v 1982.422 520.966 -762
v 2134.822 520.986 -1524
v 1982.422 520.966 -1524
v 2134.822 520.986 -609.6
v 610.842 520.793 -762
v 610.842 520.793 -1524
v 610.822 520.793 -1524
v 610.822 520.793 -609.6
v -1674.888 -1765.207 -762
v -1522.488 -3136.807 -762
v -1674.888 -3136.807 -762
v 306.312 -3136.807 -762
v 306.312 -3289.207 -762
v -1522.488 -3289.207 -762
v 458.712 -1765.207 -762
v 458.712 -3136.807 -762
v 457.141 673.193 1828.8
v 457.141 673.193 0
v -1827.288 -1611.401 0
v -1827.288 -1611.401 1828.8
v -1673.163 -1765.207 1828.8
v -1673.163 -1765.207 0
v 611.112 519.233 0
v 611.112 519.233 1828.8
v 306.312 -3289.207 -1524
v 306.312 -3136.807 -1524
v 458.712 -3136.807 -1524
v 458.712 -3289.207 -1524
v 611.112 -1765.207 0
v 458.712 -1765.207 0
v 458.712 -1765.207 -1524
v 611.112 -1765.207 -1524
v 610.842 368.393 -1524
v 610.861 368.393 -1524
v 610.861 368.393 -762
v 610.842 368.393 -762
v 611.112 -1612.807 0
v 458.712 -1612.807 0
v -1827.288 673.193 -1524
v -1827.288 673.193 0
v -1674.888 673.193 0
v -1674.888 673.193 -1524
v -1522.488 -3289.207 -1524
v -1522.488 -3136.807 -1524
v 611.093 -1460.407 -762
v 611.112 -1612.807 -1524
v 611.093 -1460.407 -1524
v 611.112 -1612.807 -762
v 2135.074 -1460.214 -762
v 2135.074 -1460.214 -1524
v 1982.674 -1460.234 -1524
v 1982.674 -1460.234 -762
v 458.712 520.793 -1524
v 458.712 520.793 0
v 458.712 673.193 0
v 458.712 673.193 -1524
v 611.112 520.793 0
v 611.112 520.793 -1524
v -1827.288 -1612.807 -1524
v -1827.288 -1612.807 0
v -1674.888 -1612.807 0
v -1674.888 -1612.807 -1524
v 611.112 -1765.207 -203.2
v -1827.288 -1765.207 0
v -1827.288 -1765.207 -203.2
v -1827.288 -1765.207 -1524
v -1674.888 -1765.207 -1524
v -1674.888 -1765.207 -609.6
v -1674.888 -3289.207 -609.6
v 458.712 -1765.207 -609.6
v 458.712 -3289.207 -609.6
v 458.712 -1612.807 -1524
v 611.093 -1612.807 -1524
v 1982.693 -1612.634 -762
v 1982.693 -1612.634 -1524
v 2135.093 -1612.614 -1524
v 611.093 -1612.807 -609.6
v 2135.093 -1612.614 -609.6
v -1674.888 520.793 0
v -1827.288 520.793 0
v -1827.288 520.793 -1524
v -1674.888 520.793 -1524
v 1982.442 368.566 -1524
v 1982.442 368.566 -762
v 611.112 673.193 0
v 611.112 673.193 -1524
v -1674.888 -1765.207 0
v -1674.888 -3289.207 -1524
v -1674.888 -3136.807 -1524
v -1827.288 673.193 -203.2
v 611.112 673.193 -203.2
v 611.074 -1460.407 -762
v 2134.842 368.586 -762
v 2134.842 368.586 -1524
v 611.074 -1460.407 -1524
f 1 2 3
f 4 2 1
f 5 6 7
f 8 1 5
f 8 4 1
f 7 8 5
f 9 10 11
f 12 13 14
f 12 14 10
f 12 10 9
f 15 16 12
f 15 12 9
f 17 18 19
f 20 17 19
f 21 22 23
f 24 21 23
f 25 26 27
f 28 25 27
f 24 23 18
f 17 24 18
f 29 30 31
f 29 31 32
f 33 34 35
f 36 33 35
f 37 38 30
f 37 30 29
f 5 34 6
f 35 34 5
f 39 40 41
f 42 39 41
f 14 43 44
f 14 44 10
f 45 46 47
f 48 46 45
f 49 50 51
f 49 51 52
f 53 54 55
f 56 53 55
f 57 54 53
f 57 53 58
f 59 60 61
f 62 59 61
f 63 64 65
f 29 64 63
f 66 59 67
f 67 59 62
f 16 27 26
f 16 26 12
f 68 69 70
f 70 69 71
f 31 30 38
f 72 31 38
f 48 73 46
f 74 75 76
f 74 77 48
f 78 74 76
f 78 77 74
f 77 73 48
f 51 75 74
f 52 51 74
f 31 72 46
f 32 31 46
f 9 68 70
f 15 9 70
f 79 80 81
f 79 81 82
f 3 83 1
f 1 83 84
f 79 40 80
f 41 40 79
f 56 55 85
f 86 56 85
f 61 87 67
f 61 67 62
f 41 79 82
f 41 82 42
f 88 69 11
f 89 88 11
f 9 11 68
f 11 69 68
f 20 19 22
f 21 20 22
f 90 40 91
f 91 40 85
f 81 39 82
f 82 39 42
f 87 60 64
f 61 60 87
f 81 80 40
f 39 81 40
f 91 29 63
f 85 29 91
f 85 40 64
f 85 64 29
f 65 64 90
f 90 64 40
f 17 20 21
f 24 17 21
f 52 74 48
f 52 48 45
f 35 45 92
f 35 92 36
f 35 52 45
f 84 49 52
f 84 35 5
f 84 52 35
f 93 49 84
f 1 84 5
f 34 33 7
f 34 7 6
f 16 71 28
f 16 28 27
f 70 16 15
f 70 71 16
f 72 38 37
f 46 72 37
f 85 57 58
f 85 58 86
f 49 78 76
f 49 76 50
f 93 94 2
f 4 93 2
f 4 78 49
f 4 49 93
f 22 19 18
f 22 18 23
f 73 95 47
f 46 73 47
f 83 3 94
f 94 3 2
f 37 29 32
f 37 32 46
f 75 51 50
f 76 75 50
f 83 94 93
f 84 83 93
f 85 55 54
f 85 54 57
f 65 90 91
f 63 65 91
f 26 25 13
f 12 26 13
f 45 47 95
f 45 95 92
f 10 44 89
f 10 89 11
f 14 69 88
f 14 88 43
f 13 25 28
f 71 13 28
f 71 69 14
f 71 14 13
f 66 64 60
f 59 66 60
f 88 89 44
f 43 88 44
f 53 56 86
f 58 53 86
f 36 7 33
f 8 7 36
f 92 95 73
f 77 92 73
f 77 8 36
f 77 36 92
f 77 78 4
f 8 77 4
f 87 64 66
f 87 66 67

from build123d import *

# Parameters (mm, degrees)
F1_W      = 152.4
F1_H      = 152.4
F2_DEPTH  = 1524
F0_W      = 2438.4
F0_H      = 2438.4
F3_DEPTH  = 203.2
F5_W      = 2133.6
F5_H      = 1524
F6_DEPTH  = 1524
F7_W      = 2133.6
F7_H      = 609.6
F7_W_2    = 1828.8
F7_H_2    = 762
F8_DEPTH  = 1524
F9_W      = 1371.6
F9_H      = 762
F10_DEPTH = 2286.001
F11_W     = 1828.8
F11_H     = 762
F11_W_2   = 2133.6
F11_H_2   = 609.6
F12_DEPTH = 1524
F13_W     = 1371.5806724171
F13_H     = 762
F14_DEPTH = 2286.3102217174
F15_DEPTH = 1828.8


with BuildPart() as f2:
    # F1 (on face) → F2 (new body)
    with BuildSketch(Plane.XY):
        with Locations((-1751.0877370298, 596.9925213552)):
            Rectangle(F1_W, F1_H)
    extrude(amount=-F2_DEPTH)


with BuildPart() as f2b:
    # F1 (on face) → F2, piece 2 (new body)
    with BuildSketch(Plane.XY):
        with Locations((-1751.0877370298, -1689.0074786448)):
            Rectangle(F1_W, F1_H)
    extrude(amount=-F2_DEPTH)


with BuildPart() as f2c:
    # F1 (on face) → F2, piece 3 (new body)
    with BuildSketch(Plane.XY):
        with Locations((534.9122629702, -1689.0074786448)):
            Rectangle(F1_W, F1_H)
    extrude(amount=-F2_DEPTH)


with BuildPart() as f2d:
    # F1 (on face) → F2, piece 4 (new body)
    with BuildSketch(Plane.XY):
        with Locations((534.9122629702, 596.9925213552)):
            Rectangle(F1_W, F1_H)
    extrude(amount=-F2_DEPTH)


with BuildPart() as f3:
    # F0 (on Top) → F3 (new body)
    with BuildSketch(Plane.XY):
        with Locations((-608.0877370298, -546.0074786448)):
            Rectangle(F0_W, F0_H)
    extrude(amount=-F3_DEPTH)


with BuildPart() as f6:
    # F5 (on face) → F6 (new body)
    with BuildSketch(Plane.XY):
        with Locations((-608.0877370298, -2527.2074786448)):
            Rectangle(F5_W, F5_H)
    extrude(amount=-F6_DEPTH)

    # F7 (on face) → F8 (cut, through all)
    with BuildSketch(Plane.XZ.offset(3289.2074786448)):
        with Locations((-608.0877370298, -304.8)):
            Rectangle(F7_W, F7_H)
        with Locations((-608.0877370298, -1143)):
            Rectangle(F7_W_2, F7_H_2)
    extrude(amount=-F8_DEPTH, mode=Mode.SUBTRACT)

    # F9 (on face) → F10 (cut, through all)
    with BuildSketch(Plane.YZ.offset(458.7122629702)):
        with Locations((-2451.0074786448, -1143)):
            Rectangle(F9_W, F9_H)
    extrude(amount=-F10_DEPTH, mode=Mode.SUBTRACT)


with BuildPart() as f6b:
    # F5 (on face) → F6, piece 2 (new body)
    with BuildSketch(Plane.XY):
        Polygon((2135.0929231315, -1612.6142040413), (2134.8223369708, 520.9857788007), (610.8223492265, 520.7925029716), (611.0929353873, -1612.8074798704), align=None)
    extrude(amount=-F6_DEPTH)

    # F11 (on face) → F12 (cut, through all)
    with BuildSketch(Plane(origin=(2134.8883747856, 0.2707495565, 0), x_dir=(-0.0001268214, 0.999999992, 0), z_dir=(0.999999992, 0.0001268214, 0))):
        with Locations((-546.0849665683, -1143)):
            Rectangle(F11_W, F11_H)
        with Locations((-546.0849665683, -304.8)):
            Rectangle(F11_W_2, F11_H_2)
    extrude(amount=-F12_DEPTH, mode=Mode.SUBTRACT)

    # F13 (on face) → F14 (cut, through all)
    with BuildSketch(Plane(origin=(0.2045483459, -1612.8849535977, 0), x_dir=(0.999999992, 0.0001268214, 0), z_dir=(0.0001268214, -0.999999992, 0))):
        with Locations((1296.6980557455, -1143)):
            Rectangle(F13_W, F13_H)
    extrude(amount=-F14_DEPTH, mode=Mode.SUBTRACT)


with BuildPart() as f15:
    # F4 (on face) → F15 (new body)
    with BuildSketch(Plane.XY):
        Polygon((457.1412205696, 673.1925213552), (-1827.2877370298, -1611.4008426666), (-1673.1633794742, -1765.2074786448), (611.1122629702, 519.2325591882), align=None)
    extrude(amount=F15_DEPTH)


solid = Compound([f2.part, f2b.part, f2c.part, f2d.part, f3.part, f6.part, f6b.part, f15.part])
